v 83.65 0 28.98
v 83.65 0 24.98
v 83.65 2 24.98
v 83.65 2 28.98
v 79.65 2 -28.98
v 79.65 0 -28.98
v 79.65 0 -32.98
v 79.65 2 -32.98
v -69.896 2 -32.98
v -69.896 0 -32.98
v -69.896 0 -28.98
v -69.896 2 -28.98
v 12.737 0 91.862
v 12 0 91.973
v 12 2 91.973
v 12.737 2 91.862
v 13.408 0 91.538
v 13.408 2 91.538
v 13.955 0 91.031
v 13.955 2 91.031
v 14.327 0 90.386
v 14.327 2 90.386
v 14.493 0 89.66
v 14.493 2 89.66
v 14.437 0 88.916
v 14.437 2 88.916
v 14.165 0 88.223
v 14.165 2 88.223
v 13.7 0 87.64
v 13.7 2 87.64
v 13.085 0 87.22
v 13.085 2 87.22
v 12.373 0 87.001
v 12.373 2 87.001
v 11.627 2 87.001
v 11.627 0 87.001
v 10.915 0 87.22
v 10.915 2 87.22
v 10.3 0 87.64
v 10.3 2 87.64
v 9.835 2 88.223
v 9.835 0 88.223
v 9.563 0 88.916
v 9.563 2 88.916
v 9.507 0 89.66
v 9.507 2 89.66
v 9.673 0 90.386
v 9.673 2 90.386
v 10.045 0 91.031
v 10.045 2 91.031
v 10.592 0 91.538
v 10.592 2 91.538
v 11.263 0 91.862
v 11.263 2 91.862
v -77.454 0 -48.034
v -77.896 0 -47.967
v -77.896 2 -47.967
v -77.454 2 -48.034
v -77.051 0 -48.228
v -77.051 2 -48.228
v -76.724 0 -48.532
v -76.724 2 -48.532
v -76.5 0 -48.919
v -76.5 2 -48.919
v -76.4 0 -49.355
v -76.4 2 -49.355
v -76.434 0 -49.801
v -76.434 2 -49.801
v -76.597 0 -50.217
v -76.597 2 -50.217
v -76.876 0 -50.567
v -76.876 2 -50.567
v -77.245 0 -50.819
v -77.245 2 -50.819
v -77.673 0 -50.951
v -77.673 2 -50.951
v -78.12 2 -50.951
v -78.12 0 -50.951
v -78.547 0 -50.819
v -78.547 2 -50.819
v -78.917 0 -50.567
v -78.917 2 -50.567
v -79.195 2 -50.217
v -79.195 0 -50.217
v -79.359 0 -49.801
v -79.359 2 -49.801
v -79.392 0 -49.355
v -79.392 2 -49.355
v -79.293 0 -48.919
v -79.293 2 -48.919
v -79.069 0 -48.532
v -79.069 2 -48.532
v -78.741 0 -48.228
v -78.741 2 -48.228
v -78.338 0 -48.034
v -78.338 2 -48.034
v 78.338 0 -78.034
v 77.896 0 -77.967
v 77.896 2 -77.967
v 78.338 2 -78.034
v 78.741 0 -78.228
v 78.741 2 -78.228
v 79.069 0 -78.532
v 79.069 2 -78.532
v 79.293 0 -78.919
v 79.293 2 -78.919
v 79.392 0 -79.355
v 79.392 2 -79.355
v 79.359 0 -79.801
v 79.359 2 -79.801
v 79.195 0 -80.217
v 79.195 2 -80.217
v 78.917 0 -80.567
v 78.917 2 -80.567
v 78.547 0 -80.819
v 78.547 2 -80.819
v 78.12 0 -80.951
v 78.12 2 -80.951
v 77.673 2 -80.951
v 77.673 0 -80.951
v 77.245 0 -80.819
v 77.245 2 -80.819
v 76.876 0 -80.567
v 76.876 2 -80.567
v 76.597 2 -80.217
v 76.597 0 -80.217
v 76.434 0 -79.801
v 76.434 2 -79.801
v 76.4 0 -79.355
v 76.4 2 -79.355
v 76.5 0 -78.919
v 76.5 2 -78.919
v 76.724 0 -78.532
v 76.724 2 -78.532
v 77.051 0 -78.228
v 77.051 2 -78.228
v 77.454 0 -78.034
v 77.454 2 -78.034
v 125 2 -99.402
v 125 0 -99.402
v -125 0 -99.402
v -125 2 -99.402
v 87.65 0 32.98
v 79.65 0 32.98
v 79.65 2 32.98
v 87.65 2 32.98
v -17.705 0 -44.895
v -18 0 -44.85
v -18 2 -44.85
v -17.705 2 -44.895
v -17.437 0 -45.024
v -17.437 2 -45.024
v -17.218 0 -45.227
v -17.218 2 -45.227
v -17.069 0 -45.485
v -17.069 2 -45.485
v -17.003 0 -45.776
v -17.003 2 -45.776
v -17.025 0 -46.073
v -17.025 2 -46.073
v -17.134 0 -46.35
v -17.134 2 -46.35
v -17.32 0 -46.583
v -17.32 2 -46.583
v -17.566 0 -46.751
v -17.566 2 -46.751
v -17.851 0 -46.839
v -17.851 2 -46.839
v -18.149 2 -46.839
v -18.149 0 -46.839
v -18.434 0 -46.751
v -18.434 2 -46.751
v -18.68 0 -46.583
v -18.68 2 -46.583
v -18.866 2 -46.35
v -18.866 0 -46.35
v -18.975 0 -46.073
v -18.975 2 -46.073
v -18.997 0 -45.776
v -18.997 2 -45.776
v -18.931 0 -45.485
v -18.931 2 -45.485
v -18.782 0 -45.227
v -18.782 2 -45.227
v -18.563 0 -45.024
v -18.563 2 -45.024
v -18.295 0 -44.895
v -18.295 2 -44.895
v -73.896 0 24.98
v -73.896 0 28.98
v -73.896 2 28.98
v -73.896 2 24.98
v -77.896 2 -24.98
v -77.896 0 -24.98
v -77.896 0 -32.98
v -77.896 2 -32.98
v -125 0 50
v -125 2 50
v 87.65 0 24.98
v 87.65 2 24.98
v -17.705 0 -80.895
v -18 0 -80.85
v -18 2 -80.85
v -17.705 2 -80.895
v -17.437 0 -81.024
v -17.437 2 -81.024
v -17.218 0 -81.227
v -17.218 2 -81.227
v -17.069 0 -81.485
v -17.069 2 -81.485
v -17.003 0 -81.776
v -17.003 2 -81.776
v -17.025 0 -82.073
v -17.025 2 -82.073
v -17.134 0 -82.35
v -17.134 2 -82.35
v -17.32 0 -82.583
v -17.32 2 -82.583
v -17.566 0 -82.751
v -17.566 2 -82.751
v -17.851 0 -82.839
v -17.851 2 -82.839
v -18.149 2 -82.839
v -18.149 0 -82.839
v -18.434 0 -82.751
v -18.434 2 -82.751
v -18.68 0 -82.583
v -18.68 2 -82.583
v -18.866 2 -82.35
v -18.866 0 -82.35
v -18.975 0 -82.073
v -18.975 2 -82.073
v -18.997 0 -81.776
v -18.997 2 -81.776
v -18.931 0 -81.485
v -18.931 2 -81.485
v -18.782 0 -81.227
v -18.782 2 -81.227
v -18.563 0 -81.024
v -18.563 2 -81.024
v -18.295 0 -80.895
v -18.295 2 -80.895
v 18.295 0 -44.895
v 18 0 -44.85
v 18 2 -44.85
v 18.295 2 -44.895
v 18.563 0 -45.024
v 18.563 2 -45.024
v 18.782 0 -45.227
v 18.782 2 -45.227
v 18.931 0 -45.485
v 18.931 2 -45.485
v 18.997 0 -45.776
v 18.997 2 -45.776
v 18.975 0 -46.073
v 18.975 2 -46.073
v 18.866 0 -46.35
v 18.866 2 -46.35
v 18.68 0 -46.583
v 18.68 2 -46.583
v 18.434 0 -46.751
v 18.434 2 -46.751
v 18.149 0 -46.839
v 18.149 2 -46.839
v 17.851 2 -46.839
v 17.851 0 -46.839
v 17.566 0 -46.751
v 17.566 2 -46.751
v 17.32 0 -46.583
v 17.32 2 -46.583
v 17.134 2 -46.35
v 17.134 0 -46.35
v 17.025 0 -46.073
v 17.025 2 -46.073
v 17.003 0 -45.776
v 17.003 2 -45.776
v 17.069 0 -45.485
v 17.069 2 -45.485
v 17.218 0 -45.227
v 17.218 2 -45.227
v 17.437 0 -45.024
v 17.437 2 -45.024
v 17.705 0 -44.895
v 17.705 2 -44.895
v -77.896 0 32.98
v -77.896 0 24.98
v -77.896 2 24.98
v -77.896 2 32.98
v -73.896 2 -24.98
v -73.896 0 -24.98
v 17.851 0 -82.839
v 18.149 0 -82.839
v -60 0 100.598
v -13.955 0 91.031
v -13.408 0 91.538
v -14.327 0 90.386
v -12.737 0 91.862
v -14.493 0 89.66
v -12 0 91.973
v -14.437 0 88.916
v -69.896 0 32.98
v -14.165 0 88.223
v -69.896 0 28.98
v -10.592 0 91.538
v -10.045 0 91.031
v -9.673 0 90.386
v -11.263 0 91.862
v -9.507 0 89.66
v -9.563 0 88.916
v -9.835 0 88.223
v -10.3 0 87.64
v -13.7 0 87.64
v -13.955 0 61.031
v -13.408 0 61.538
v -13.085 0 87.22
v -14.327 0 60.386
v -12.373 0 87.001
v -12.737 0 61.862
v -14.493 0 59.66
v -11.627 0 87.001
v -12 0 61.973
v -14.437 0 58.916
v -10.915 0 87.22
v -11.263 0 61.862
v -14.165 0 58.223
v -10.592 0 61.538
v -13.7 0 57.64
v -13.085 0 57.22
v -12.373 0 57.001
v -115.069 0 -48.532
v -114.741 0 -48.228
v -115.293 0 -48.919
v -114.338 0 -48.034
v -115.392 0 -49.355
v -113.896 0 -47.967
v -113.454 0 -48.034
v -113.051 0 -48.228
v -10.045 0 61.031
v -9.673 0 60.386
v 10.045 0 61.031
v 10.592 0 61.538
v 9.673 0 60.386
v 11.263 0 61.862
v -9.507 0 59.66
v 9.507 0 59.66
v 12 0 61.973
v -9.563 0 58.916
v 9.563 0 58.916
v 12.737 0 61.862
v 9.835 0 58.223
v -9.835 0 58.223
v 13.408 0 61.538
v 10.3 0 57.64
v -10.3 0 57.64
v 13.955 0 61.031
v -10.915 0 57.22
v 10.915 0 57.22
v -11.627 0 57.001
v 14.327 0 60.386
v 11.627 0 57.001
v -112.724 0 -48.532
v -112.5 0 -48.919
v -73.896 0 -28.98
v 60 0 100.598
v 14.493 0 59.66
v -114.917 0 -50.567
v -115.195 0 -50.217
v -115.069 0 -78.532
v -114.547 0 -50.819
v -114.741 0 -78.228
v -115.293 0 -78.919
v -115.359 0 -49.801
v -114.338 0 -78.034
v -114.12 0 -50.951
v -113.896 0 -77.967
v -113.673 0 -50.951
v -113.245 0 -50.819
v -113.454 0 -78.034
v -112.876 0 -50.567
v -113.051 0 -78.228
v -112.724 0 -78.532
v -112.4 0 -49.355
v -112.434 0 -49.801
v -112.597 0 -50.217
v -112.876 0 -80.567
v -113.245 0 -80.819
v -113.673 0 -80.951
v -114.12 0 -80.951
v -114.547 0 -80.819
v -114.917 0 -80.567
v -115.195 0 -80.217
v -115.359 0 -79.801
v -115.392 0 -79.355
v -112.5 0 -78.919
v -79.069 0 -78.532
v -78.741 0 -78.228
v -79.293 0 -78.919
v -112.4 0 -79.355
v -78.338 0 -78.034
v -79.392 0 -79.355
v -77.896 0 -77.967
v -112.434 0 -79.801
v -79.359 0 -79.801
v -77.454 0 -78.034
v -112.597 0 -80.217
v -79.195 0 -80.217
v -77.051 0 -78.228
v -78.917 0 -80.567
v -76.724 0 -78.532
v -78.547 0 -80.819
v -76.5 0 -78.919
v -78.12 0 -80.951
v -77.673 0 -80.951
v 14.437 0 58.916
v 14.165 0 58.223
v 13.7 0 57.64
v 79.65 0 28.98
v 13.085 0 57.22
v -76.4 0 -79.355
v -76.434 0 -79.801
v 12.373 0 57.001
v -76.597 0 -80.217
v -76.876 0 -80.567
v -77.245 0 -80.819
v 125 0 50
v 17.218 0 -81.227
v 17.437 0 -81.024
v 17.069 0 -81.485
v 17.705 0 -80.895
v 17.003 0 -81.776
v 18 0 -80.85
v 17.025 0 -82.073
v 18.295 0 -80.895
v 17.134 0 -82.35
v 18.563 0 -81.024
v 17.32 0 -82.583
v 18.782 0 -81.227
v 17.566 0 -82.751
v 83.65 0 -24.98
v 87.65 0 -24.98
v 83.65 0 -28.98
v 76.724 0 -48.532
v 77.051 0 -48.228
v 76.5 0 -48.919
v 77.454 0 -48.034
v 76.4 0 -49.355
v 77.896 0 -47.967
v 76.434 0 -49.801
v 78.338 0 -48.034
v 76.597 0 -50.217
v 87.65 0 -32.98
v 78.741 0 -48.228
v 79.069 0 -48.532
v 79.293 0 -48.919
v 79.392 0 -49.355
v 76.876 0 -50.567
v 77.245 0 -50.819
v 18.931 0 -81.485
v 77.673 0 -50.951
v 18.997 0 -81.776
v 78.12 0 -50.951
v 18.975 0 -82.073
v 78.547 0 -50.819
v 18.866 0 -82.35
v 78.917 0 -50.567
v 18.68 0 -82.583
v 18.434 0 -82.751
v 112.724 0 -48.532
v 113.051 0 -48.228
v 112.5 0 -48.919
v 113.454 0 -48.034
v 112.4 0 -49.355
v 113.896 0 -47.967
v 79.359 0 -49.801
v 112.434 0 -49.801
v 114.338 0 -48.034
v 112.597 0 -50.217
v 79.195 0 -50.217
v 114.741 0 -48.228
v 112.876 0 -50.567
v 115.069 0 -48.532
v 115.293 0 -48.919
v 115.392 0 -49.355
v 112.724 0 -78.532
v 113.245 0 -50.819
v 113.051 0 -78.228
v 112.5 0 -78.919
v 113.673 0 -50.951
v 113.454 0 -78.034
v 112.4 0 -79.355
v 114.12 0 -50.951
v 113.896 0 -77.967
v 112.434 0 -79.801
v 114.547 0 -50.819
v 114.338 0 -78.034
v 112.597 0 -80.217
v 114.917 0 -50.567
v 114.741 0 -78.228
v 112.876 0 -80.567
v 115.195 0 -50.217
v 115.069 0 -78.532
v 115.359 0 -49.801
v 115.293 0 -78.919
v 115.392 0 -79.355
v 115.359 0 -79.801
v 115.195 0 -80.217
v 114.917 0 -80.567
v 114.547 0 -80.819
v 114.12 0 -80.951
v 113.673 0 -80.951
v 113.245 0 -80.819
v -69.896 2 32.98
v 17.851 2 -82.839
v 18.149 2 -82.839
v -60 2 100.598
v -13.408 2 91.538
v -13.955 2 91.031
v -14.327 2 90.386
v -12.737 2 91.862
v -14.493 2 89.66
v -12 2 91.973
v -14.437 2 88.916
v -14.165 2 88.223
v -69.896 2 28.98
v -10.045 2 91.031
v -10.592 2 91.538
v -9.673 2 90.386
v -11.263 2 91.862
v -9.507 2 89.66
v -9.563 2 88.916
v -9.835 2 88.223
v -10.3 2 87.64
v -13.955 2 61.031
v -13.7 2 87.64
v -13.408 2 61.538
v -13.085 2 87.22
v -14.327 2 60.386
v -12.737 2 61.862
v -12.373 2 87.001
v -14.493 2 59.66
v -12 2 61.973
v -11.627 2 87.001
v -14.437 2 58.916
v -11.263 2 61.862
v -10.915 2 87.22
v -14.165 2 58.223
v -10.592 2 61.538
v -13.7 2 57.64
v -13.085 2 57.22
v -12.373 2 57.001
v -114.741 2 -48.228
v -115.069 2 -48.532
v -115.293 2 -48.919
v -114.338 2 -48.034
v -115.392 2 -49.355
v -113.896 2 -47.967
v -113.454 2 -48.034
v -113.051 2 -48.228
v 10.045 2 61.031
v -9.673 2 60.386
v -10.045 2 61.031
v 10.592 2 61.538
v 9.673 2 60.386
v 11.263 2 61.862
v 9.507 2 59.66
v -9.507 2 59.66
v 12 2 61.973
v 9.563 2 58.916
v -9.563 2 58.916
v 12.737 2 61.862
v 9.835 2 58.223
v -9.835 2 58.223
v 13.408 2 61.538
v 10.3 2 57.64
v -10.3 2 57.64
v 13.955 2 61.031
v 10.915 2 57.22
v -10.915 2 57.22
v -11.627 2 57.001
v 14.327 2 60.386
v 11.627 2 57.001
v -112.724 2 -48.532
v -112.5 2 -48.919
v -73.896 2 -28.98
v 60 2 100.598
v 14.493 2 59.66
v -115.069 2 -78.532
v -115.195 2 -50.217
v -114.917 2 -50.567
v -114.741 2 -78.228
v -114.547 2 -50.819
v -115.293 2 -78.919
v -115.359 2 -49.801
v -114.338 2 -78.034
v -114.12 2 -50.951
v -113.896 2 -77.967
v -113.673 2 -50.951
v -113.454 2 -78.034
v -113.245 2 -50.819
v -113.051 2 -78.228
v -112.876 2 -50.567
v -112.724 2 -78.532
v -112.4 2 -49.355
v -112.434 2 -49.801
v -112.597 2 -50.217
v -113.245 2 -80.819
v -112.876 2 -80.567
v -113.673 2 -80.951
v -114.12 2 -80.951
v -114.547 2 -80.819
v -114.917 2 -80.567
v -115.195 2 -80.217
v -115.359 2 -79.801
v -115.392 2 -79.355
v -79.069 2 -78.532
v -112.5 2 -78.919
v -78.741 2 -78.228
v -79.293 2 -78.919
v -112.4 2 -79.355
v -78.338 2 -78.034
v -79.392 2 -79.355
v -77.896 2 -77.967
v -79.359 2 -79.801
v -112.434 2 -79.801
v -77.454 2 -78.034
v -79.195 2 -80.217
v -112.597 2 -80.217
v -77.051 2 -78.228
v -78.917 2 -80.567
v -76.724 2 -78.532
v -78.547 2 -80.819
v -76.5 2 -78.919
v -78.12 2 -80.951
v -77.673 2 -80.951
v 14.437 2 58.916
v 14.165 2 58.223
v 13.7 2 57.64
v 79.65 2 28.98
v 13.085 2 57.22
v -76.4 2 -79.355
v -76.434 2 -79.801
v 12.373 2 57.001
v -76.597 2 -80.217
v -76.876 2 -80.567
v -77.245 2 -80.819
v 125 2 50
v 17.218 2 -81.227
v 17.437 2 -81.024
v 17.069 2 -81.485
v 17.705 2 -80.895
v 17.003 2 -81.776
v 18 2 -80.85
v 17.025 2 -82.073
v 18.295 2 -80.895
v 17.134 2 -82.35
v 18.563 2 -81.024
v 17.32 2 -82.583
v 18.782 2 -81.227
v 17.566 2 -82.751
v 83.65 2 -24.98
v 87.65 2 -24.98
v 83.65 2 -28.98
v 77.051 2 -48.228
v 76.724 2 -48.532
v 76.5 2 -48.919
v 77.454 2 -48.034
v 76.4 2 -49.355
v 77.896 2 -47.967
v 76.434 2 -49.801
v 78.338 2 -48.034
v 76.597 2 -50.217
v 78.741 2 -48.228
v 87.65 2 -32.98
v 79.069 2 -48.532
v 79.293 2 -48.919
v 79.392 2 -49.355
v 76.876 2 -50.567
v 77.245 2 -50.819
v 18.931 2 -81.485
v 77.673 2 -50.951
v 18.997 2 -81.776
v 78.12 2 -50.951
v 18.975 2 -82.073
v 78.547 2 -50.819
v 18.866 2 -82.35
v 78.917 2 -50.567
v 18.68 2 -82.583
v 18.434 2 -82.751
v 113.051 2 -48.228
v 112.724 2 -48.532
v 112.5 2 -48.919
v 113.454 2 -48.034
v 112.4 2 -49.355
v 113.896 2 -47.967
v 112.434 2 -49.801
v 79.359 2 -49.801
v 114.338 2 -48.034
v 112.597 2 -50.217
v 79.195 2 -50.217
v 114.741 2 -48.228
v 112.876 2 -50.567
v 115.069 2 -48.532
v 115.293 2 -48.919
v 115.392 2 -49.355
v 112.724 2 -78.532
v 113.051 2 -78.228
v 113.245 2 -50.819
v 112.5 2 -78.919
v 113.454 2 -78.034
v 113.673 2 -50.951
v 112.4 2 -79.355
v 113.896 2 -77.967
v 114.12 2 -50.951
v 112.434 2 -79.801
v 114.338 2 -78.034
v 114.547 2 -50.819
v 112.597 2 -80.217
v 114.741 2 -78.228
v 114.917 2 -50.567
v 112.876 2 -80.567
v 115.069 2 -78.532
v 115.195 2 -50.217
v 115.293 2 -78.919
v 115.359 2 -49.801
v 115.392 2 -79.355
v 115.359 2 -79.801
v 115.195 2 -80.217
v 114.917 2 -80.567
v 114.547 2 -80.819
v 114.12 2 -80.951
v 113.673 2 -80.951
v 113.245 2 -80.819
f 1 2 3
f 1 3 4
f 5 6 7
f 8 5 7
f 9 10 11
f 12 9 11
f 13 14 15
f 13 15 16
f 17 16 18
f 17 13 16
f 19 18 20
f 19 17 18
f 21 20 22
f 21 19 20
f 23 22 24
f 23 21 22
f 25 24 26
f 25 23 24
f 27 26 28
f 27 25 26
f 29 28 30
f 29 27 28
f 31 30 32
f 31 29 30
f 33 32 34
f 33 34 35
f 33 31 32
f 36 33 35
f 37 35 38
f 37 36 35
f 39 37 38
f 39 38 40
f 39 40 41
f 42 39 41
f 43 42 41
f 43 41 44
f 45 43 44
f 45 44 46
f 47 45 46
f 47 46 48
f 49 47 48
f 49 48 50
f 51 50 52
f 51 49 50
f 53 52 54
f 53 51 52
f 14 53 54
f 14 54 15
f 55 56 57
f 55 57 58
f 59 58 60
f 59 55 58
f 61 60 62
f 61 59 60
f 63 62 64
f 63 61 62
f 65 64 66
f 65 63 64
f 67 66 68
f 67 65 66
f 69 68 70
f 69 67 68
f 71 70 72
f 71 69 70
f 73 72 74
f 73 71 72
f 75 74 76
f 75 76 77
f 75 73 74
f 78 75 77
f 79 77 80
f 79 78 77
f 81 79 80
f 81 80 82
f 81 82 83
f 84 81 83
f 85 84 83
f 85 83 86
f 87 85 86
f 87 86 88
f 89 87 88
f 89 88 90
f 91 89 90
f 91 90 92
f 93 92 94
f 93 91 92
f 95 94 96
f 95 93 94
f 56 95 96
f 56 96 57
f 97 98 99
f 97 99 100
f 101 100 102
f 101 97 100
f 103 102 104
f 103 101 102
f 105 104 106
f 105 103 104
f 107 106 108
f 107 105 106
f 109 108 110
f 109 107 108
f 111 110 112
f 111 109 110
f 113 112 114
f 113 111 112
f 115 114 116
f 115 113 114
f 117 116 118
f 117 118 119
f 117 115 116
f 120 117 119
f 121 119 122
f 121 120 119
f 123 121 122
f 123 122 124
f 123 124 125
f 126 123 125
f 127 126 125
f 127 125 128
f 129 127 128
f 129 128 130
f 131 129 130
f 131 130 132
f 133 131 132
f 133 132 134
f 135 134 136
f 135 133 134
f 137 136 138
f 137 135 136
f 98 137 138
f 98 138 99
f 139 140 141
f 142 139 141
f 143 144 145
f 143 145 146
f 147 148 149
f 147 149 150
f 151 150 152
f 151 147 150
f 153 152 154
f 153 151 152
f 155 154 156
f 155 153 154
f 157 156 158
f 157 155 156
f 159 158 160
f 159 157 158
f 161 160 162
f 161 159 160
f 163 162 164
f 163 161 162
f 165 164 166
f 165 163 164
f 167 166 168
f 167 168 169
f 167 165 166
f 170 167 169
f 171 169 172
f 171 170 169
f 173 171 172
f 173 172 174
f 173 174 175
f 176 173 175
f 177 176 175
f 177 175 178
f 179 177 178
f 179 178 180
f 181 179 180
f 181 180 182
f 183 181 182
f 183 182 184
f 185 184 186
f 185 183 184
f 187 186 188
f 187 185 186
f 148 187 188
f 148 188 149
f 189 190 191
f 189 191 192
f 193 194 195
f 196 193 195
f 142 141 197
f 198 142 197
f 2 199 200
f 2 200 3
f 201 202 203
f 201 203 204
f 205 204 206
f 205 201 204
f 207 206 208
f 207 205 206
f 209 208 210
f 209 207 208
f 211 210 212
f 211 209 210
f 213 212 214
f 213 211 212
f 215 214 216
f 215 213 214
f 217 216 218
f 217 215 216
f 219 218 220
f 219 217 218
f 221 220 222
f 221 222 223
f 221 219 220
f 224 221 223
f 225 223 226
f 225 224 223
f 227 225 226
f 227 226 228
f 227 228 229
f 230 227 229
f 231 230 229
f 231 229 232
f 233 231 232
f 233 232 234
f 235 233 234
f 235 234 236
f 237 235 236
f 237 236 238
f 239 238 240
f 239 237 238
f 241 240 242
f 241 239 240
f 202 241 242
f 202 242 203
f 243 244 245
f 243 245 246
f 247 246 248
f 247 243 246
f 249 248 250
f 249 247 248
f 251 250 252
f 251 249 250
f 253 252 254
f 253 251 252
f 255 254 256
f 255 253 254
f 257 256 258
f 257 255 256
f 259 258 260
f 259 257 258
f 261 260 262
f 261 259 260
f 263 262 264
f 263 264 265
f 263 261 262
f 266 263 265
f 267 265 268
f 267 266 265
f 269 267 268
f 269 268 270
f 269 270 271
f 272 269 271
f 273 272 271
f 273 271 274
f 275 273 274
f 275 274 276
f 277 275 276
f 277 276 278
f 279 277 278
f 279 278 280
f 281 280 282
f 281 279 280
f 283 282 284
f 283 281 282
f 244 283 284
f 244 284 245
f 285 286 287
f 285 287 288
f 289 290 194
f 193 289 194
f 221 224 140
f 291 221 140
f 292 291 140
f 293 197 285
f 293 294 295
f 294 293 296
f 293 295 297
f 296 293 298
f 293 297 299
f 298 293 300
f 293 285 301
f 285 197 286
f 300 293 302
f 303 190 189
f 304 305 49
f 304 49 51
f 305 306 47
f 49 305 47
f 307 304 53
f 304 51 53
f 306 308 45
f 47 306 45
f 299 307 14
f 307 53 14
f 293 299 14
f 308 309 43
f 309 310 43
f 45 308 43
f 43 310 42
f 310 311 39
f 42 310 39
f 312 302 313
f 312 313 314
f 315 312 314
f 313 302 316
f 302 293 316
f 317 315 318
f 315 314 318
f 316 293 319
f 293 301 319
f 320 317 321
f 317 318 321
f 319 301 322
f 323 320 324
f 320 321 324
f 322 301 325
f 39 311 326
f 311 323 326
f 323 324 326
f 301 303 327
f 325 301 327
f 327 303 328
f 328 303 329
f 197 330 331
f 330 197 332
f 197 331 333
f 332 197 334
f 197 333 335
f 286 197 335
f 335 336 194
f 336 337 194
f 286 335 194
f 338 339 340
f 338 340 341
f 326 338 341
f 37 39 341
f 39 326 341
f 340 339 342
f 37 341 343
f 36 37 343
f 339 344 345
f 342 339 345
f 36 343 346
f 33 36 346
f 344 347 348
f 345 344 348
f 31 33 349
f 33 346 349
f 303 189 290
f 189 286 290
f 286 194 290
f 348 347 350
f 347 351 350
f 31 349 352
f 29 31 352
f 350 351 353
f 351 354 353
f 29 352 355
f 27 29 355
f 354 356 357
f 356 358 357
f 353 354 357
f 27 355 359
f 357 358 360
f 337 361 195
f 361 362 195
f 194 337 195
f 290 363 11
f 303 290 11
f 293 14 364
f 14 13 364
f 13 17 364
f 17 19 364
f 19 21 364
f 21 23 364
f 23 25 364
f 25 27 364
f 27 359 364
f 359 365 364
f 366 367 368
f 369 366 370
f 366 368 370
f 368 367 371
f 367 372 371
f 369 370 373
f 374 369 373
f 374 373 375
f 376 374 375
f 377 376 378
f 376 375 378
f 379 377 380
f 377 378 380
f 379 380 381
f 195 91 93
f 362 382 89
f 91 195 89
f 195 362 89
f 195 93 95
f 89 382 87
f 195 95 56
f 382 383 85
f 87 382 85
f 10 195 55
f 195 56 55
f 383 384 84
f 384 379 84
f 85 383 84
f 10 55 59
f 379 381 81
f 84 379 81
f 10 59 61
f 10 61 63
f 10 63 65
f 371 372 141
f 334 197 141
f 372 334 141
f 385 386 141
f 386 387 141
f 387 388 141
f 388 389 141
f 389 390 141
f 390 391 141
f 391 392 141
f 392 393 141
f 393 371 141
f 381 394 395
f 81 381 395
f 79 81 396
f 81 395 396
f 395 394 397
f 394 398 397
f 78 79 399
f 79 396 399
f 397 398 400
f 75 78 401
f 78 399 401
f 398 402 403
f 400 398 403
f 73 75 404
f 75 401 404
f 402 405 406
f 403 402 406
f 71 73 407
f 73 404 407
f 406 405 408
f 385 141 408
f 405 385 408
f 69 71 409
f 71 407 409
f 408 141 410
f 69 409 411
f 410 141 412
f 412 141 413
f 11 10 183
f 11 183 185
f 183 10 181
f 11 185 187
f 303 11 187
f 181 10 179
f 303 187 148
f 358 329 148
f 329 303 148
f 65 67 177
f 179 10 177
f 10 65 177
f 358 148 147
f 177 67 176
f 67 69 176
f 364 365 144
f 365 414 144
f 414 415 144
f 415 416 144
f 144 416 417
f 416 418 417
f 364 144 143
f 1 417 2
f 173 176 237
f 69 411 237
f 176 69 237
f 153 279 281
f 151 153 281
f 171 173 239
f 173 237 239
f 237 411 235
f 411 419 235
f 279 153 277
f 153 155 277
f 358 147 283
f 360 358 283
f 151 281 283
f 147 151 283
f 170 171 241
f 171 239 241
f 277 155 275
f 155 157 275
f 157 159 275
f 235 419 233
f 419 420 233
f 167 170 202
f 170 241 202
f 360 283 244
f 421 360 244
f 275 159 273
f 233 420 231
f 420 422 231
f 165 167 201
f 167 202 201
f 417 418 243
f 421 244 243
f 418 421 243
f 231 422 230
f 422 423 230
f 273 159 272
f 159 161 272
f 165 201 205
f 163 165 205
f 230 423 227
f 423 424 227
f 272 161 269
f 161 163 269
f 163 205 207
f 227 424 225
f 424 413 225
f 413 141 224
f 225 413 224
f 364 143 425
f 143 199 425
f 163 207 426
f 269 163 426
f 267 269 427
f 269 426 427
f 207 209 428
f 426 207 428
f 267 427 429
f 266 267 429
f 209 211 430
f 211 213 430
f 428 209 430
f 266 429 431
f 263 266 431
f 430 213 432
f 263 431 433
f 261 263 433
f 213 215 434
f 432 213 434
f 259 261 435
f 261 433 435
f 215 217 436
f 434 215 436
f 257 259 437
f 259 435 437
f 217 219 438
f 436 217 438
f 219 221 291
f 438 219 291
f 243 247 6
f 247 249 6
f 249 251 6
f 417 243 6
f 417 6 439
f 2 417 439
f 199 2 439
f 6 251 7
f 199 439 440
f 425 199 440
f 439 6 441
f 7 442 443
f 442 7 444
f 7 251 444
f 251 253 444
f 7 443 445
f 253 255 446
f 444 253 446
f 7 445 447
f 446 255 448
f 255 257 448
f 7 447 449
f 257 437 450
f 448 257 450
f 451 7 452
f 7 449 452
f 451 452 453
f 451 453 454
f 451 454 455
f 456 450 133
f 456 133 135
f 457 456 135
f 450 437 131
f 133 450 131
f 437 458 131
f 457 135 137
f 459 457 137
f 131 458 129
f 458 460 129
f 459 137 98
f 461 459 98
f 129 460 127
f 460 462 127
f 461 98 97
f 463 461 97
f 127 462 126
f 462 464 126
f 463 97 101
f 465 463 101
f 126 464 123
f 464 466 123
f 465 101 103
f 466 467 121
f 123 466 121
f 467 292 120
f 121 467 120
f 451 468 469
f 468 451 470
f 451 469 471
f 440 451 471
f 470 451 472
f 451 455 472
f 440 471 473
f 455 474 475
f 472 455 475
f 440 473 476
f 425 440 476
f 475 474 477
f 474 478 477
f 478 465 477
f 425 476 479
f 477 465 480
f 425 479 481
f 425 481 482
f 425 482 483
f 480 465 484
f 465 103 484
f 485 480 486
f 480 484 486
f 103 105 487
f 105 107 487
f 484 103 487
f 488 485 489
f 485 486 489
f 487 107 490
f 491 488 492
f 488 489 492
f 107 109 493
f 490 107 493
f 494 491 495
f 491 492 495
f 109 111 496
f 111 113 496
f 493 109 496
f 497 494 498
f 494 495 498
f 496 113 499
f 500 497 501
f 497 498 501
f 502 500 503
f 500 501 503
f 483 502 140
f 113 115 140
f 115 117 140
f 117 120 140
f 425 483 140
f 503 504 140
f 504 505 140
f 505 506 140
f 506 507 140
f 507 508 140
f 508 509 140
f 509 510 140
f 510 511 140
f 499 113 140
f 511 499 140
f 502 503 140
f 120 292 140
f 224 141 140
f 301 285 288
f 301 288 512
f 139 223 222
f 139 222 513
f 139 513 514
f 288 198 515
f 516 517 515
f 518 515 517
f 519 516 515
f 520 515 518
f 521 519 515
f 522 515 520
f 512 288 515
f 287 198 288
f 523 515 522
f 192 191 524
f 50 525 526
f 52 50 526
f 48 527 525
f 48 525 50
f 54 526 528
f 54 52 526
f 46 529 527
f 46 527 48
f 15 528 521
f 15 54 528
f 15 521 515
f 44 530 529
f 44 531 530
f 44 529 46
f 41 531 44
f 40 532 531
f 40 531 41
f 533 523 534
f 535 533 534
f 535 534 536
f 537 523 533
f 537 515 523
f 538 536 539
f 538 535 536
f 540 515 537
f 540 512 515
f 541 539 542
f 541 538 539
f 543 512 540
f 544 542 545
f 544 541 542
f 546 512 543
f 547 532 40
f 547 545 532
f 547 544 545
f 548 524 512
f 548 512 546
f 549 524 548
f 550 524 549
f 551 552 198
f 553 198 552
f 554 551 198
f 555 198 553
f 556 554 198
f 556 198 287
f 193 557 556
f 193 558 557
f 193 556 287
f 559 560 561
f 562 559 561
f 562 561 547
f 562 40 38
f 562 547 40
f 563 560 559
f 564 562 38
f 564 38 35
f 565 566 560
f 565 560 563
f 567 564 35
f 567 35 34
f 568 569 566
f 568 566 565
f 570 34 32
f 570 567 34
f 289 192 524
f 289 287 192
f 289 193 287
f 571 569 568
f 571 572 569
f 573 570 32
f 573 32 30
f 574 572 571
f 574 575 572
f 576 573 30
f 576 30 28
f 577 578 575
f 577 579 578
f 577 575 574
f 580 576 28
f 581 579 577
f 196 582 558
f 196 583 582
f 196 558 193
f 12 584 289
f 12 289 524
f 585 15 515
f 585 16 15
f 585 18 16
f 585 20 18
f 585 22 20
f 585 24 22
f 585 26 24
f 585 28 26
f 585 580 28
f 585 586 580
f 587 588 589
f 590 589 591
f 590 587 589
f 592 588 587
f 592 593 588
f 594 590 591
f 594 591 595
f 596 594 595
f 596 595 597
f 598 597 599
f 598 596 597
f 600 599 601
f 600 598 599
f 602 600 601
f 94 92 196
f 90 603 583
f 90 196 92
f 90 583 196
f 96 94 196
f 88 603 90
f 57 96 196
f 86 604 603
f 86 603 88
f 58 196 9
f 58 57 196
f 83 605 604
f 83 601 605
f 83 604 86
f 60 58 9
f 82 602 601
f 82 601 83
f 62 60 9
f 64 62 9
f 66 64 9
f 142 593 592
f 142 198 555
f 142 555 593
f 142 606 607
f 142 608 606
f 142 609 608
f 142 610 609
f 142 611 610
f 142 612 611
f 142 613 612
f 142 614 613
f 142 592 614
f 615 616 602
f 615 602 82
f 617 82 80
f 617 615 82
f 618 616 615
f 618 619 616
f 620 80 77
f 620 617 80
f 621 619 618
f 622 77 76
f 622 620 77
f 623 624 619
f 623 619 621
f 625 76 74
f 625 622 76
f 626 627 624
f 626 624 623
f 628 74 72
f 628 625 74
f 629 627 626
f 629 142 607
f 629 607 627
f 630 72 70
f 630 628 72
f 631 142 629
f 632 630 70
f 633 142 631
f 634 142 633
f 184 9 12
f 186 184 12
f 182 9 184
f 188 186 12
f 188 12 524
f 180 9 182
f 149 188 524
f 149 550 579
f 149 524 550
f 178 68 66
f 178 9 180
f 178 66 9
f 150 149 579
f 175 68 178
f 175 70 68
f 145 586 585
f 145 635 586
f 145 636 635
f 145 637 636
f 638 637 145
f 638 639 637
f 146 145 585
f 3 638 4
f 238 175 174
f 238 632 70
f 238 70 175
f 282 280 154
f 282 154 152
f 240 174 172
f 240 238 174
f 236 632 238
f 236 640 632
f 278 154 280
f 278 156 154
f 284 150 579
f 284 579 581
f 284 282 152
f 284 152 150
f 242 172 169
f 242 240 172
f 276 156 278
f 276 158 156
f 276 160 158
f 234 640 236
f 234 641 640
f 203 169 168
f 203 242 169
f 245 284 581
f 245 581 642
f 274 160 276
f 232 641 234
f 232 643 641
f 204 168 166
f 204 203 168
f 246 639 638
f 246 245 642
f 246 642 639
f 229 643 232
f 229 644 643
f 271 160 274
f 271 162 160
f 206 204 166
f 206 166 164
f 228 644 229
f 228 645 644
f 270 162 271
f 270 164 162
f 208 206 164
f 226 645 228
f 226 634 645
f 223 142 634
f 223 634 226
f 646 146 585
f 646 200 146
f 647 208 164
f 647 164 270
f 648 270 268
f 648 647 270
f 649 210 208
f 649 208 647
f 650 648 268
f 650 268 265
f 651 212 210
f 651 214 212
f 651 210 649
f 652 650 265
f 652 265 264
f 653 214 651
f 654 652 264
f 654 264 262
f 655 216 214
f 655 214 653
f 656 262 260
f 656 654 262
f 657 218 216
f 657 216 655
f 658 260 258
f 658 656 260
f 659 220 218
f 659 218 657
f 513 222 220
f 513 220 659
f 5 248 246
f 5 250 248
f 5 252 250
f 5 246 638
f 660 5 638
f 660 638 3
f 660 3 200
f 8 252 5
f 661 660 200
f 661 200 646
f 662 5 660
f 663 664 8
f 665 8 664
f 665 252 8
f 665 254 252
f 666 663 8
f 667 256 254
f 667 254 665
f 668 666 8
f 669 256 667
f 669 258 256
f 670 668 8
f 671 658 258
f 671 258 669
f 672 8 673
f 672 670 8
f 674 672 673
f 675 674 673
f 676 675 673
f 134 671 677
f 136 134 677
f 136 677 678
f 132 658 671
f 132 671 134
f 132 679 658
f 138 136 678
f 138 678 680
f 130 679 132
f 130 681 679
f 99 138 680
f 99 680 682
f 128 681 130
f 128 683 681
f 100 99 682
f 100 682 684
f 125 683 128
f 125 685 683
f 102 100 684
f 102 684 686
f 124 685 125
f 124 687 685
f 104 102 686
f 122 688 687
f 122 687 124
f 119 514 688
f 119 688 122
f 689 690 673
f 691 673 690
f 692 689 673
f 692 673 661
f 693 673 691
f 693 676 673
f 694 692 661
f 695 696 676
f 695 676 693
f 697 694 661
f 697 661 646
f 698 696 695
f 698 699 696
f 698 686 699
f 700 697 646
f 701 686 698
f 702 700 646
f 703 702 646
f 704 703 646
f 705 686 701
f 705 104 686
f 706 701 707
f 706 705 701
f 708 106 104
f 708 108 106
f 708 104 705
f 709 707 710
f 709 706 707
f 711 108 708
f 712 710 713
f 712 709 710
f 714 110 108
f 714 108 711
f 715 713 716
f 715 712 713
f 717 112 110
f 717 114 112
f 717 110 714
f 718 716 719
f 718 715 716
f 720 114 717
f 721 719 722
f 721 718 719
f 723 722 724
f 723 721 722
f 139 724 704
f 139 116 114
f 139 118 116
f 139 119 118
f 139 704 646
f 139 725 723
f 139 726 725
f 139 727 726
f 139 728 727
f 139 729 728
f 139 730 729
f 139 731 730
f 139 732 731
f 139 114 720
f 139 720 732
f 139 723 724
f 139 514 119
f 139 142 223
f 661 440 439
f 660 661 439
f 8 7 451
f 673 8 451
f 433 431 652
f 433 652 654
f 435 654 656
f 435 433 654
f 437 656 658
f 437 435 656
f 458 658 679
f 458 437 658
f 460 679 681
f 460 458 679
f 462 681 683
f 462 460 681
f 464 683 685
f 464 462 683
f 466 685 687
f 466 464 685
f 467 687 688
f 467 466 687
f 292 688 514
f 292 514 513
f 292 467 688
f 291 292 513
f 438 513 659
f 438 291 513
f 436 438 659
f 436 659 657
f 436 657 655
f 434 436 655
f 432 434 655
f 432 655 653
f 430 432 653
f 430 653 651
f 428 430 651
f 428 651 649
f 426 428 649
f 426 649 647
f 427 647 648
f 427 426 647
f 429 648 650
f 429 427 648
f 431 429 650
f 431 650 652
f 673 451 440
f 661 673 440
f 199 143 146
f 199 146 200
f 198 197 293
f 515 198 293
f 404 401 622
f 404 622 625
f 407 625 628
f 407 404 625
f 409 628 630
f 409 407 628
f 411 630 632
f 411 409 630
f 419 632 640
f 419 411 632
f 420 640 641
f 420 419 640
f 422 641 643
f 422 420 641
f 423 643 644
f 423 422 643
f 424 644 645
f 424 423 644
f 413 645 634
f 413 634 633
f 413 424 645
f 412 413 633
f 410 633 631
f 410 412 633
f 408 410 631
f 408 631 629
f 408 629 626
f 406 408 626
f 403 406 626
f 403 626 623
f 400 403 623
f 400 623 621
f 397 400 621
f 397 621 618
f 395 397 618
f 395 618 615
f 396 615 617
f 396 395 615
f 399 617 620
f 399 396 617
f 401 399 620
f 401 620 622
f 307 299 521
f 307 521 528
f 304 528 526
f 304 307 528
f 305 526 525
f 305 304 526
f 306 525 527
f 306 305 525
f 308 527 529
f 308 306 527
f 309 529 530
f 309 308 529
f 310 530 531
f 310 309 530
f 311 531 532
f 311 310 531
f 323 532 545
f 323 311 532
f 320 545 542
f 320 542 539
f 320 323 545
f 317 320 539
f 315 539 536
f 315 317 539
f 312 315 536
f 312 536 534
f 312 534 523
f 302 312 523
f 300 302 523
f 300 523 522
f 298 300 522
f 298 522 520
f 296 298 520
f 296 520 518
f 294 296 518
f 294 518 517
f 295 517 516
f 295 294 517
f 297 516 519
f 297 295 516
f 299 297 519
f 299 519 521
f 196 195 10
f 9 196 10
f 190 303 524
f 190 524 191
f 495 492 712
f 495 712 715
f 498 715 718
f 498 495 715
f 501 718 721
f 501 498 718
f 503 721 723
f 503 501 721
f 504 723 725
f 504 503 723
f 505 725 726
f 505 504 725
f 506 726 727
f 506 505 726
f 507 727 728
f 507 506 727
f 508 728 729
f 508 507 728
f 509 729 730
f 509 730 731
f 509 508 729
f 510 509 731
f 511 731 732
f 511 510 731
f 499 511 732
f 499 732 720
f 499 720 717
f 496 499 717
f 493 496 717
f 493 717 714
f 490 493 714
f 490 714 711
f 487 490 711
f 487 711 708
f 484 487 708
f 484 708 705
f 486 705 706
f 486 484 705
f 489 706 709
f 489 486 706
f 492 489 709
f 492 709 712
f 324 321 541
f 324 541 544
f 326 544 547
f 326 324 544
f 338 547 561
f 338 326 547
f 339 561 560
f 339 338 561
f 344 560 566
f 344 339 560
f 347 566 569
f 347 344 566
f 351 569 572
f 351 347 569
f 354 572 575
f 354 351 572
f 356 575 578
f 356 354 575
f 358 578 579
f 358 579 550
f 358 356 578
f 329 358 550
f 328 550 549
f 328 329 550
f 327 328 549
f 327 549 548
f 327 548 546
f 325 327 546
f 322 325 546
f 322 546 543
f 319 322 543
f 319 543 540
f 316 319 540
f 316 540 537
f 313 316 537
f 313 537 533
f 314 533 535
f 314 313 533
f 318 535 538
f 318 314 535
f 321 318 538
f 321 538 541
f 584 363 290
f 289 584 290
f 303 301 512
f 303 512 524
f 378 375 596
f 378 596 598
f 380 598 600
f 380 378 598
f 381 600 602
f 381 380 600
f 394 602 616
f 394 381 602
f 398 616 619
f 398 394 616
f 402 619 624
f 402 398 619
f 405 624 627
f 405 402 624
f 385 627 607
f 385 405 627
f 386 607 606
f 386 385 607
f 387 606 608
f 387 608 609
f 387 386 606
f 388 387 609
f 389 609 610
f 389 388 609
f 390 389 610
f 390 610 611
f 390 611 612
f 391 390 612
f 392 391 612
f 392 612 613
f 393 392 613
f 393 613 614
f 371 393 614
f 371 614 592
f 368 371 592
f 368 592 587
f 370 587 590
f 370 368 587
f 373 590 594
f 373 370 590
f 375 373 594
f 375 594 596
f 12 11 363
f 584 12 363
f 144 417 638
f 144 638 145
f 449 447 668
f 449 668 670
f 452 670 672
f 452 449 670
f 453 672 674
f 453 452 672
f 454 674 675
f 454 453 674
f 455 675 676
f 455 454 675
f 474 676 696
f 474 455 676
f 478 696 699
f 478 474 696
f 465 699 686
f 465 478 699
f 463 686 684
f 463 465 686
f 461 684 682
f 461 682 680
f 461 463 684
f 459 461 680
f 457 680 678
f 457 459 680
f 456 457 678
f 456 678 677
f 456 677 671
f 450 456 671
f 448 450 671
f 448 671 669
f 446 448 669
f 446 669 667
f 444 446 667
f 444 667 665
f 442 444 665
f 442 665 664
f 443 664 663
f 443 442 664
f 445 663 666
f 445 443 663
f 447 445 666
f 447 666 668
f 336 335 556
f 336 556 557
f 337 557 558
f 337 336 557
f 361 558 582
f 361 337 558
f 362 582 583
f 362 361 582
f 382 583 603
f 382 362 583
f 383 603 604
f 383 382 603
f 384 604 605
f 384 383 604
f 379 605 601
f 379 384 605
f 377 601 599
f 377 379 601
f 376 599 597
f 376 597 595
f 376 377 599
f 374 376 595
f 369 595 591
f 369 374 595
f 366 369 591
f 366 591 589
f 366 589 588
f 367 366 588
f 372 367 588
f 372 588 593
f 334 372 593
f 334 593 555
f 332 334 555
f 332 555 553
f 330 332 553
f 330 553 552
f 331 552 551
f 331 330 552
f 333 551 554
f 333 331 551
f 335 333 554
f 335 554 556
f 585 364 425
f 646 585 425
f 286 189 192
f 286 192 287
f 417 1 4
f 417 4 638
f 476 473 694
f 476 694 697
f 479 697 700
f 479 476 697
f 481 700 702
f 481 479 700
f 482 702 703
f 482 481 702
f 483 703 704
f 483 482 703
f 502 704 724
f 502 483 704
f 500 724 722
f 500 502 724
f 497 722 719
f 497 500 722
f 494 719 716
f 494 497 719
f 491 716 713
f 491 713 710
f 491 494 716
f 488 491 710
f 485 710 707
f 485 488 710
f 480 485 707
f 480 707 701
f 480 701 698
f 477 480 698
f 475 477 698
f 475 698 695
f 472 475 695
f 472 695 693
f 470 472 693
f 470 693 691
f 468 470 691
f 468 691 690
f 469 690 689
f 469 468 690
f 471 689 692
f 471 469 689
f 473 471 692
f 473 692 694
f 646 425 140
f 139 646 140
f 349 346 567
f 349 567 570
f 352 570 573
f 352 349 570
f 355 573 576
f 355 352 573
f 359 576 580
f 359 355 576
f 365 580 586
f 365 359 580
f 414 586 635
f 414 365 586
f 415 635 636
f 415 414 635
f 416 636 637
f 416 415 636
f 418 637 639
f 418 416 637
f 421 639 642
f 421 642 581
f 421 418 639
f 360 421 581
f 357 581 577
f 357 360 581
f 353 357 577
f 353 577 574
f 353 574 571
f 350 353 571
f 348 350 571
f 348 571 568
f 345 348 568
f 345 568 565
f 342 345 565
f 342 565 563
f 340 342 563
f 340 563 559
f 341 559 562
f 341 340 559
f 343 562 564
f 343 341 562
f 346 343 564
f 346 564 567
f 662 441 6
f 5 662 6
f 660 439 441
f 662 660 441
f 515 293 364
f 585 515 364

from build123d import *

# Parameters (mm, degrees)
SKETCH1_R           = 1.5
SKETCH1_R_2         = 1
SKETCH1_R_3         = 2.5
BOSS_EXTRUDE1_DEPTH = 2


with BuildPart() as part:
    # Sketch1 → Boss-Extrude1 (new body)
    with BuildSketch(Plane(origin=(0, 0, 0), x_dir=(1, 0, 0), z_dir=(0, 1, 0))):
        Polygon((-125, -50), (-60, -100.598017019), (60, -100.598017019), (125, -50), (125, 99.401982981), (-125, 99.401982981), align=None)
        with Locations(Location((-77.896249371, 49.467404951, 0), (0, 0, 270))):
            Circle(SKETCH1_R, mode=Mode.SUBTRACT)
        with Locations(Location((-77.896249371, 79.467404951, 0), (0, 0, 270))):
            Circle(SKETCH1_R, mode=Mode.SUBTRACT)
        with Locations(Location((-113.896249371, 79.467404951, 0), (0, 0, 270))):
            Circle(SKETCH1_R, mode=Mode.SUBTRACT)
        with Locations(Location((-113.896249371, 49.467404951, 0), (0, 0, 270))):
            Circle(SKETCH1_R, mode=Mode.SUBTRACT)
        with Locations(Location((113.896249371, 49.467404951, 0), (0, 0, 270))):
            Circle(SKETCH1_R, mode=Mode.SUBTRACT)
        with Locations(Location((113.896249371, 79.467404951, 0), (0, 0, 270))):
            Circle(SKETCH1_R, mode=Mode.SUBTRACT)
        with Locations(Location((77.896249371, 79.467404951, 0), (0, 0, 270))):
            Circle(SKETCH1_R, mode=Mode.SUBTRACT)
        with Locations(Location((77.896249371, 49.467404951, 0), (0, 0, 270))):
            Circle(SKETCH1_R, mode=Mode.SUBTRACT)
        with Locations(Location((-18, 81.850418852, 0), (0, 0, 270))):
            Circle(SKETCH1_R_2, mode=Mode.SUBTRACT)
        with Locations(Location((-18, 45.850418852, 0), (0, 0, 270))):
            Circle(SKETCH1_R_2, mode=Mode.SUBTRACT)
        with Locations(Location((18, 81.850418852, 0), (0, 0, 270))):
            Circle(SKETCH1_R_2, mode=Mode.SUBTRACT)
        with Locations(Location((18, 45.850418852, 0), (0, 0, 270))):
            Circle(SKETCH1_R_2, mode=Mode.SUBTRACT)
        with Locations(Location((-12, -59.472750438, 0), (0, 0, 270))):
            Circle(SKETCH1_R_3, mode=Mode.SUBTRACT)
        with Locations(Location((12, -59.472750438, 0), (0, 0, 270))):
            Circle(SKETCH1_R_3, mode=Mode.SUBTRACT)
        with Locations(Location((12, -89.472750438, 0), (0, 0, 270))):
            Circle(SKETCH1_R_3, mode=Mode.SUBTRACT)
        with Locations(Location((-12, -89.472750438, 0), (0, 0, 270))):
            Circle(SKETCH1_R_3, mode=Mode.SUBTRACT)
        Polygon((-69.896249371, 32.980170885), (-69.896249371, 28.980170885), (-73.896249371, 28.980170885), (-73.896249371, 24.980170885), (-77.896249371, 24.980170885), (-77.896249371, 32.980170885), align=None, mode=Mode.SUBTRACT)
        Polygon((-77.896249371, -24.980170885), (-77.896249371, -32.980170885), (-69.896249371, -32.980170885), (-69.896249371, -28.980170885), (-73.896249371, -28.980170885), (-73.896249371, -24.980170885), align=None, mode=Mode.SUBTRACT)
        Polygon((79.650184211, 32.980170885), (87.650184211, 32.980170885), (87.650184211, 24.980170885), (83.650184211, 24.980170885), (83.650184211, 28.980170885), (79.650184211, 28.980170885), align=None, mode=Mode.SUBTRACT)
        Polygon((83.650184211, -28.980170885), (79.650184211, -28.980170885), (79.650184211, -32.980170885), (87.650184211, -32.980170885), (87.650184211, -24.980170885), (83.650184211, -24.980170885), align=None, mode=Mode.SUBTRACT)
    extrude(amount=BOSS_EXTRUDE1_DEPTH)


solid = part.part
